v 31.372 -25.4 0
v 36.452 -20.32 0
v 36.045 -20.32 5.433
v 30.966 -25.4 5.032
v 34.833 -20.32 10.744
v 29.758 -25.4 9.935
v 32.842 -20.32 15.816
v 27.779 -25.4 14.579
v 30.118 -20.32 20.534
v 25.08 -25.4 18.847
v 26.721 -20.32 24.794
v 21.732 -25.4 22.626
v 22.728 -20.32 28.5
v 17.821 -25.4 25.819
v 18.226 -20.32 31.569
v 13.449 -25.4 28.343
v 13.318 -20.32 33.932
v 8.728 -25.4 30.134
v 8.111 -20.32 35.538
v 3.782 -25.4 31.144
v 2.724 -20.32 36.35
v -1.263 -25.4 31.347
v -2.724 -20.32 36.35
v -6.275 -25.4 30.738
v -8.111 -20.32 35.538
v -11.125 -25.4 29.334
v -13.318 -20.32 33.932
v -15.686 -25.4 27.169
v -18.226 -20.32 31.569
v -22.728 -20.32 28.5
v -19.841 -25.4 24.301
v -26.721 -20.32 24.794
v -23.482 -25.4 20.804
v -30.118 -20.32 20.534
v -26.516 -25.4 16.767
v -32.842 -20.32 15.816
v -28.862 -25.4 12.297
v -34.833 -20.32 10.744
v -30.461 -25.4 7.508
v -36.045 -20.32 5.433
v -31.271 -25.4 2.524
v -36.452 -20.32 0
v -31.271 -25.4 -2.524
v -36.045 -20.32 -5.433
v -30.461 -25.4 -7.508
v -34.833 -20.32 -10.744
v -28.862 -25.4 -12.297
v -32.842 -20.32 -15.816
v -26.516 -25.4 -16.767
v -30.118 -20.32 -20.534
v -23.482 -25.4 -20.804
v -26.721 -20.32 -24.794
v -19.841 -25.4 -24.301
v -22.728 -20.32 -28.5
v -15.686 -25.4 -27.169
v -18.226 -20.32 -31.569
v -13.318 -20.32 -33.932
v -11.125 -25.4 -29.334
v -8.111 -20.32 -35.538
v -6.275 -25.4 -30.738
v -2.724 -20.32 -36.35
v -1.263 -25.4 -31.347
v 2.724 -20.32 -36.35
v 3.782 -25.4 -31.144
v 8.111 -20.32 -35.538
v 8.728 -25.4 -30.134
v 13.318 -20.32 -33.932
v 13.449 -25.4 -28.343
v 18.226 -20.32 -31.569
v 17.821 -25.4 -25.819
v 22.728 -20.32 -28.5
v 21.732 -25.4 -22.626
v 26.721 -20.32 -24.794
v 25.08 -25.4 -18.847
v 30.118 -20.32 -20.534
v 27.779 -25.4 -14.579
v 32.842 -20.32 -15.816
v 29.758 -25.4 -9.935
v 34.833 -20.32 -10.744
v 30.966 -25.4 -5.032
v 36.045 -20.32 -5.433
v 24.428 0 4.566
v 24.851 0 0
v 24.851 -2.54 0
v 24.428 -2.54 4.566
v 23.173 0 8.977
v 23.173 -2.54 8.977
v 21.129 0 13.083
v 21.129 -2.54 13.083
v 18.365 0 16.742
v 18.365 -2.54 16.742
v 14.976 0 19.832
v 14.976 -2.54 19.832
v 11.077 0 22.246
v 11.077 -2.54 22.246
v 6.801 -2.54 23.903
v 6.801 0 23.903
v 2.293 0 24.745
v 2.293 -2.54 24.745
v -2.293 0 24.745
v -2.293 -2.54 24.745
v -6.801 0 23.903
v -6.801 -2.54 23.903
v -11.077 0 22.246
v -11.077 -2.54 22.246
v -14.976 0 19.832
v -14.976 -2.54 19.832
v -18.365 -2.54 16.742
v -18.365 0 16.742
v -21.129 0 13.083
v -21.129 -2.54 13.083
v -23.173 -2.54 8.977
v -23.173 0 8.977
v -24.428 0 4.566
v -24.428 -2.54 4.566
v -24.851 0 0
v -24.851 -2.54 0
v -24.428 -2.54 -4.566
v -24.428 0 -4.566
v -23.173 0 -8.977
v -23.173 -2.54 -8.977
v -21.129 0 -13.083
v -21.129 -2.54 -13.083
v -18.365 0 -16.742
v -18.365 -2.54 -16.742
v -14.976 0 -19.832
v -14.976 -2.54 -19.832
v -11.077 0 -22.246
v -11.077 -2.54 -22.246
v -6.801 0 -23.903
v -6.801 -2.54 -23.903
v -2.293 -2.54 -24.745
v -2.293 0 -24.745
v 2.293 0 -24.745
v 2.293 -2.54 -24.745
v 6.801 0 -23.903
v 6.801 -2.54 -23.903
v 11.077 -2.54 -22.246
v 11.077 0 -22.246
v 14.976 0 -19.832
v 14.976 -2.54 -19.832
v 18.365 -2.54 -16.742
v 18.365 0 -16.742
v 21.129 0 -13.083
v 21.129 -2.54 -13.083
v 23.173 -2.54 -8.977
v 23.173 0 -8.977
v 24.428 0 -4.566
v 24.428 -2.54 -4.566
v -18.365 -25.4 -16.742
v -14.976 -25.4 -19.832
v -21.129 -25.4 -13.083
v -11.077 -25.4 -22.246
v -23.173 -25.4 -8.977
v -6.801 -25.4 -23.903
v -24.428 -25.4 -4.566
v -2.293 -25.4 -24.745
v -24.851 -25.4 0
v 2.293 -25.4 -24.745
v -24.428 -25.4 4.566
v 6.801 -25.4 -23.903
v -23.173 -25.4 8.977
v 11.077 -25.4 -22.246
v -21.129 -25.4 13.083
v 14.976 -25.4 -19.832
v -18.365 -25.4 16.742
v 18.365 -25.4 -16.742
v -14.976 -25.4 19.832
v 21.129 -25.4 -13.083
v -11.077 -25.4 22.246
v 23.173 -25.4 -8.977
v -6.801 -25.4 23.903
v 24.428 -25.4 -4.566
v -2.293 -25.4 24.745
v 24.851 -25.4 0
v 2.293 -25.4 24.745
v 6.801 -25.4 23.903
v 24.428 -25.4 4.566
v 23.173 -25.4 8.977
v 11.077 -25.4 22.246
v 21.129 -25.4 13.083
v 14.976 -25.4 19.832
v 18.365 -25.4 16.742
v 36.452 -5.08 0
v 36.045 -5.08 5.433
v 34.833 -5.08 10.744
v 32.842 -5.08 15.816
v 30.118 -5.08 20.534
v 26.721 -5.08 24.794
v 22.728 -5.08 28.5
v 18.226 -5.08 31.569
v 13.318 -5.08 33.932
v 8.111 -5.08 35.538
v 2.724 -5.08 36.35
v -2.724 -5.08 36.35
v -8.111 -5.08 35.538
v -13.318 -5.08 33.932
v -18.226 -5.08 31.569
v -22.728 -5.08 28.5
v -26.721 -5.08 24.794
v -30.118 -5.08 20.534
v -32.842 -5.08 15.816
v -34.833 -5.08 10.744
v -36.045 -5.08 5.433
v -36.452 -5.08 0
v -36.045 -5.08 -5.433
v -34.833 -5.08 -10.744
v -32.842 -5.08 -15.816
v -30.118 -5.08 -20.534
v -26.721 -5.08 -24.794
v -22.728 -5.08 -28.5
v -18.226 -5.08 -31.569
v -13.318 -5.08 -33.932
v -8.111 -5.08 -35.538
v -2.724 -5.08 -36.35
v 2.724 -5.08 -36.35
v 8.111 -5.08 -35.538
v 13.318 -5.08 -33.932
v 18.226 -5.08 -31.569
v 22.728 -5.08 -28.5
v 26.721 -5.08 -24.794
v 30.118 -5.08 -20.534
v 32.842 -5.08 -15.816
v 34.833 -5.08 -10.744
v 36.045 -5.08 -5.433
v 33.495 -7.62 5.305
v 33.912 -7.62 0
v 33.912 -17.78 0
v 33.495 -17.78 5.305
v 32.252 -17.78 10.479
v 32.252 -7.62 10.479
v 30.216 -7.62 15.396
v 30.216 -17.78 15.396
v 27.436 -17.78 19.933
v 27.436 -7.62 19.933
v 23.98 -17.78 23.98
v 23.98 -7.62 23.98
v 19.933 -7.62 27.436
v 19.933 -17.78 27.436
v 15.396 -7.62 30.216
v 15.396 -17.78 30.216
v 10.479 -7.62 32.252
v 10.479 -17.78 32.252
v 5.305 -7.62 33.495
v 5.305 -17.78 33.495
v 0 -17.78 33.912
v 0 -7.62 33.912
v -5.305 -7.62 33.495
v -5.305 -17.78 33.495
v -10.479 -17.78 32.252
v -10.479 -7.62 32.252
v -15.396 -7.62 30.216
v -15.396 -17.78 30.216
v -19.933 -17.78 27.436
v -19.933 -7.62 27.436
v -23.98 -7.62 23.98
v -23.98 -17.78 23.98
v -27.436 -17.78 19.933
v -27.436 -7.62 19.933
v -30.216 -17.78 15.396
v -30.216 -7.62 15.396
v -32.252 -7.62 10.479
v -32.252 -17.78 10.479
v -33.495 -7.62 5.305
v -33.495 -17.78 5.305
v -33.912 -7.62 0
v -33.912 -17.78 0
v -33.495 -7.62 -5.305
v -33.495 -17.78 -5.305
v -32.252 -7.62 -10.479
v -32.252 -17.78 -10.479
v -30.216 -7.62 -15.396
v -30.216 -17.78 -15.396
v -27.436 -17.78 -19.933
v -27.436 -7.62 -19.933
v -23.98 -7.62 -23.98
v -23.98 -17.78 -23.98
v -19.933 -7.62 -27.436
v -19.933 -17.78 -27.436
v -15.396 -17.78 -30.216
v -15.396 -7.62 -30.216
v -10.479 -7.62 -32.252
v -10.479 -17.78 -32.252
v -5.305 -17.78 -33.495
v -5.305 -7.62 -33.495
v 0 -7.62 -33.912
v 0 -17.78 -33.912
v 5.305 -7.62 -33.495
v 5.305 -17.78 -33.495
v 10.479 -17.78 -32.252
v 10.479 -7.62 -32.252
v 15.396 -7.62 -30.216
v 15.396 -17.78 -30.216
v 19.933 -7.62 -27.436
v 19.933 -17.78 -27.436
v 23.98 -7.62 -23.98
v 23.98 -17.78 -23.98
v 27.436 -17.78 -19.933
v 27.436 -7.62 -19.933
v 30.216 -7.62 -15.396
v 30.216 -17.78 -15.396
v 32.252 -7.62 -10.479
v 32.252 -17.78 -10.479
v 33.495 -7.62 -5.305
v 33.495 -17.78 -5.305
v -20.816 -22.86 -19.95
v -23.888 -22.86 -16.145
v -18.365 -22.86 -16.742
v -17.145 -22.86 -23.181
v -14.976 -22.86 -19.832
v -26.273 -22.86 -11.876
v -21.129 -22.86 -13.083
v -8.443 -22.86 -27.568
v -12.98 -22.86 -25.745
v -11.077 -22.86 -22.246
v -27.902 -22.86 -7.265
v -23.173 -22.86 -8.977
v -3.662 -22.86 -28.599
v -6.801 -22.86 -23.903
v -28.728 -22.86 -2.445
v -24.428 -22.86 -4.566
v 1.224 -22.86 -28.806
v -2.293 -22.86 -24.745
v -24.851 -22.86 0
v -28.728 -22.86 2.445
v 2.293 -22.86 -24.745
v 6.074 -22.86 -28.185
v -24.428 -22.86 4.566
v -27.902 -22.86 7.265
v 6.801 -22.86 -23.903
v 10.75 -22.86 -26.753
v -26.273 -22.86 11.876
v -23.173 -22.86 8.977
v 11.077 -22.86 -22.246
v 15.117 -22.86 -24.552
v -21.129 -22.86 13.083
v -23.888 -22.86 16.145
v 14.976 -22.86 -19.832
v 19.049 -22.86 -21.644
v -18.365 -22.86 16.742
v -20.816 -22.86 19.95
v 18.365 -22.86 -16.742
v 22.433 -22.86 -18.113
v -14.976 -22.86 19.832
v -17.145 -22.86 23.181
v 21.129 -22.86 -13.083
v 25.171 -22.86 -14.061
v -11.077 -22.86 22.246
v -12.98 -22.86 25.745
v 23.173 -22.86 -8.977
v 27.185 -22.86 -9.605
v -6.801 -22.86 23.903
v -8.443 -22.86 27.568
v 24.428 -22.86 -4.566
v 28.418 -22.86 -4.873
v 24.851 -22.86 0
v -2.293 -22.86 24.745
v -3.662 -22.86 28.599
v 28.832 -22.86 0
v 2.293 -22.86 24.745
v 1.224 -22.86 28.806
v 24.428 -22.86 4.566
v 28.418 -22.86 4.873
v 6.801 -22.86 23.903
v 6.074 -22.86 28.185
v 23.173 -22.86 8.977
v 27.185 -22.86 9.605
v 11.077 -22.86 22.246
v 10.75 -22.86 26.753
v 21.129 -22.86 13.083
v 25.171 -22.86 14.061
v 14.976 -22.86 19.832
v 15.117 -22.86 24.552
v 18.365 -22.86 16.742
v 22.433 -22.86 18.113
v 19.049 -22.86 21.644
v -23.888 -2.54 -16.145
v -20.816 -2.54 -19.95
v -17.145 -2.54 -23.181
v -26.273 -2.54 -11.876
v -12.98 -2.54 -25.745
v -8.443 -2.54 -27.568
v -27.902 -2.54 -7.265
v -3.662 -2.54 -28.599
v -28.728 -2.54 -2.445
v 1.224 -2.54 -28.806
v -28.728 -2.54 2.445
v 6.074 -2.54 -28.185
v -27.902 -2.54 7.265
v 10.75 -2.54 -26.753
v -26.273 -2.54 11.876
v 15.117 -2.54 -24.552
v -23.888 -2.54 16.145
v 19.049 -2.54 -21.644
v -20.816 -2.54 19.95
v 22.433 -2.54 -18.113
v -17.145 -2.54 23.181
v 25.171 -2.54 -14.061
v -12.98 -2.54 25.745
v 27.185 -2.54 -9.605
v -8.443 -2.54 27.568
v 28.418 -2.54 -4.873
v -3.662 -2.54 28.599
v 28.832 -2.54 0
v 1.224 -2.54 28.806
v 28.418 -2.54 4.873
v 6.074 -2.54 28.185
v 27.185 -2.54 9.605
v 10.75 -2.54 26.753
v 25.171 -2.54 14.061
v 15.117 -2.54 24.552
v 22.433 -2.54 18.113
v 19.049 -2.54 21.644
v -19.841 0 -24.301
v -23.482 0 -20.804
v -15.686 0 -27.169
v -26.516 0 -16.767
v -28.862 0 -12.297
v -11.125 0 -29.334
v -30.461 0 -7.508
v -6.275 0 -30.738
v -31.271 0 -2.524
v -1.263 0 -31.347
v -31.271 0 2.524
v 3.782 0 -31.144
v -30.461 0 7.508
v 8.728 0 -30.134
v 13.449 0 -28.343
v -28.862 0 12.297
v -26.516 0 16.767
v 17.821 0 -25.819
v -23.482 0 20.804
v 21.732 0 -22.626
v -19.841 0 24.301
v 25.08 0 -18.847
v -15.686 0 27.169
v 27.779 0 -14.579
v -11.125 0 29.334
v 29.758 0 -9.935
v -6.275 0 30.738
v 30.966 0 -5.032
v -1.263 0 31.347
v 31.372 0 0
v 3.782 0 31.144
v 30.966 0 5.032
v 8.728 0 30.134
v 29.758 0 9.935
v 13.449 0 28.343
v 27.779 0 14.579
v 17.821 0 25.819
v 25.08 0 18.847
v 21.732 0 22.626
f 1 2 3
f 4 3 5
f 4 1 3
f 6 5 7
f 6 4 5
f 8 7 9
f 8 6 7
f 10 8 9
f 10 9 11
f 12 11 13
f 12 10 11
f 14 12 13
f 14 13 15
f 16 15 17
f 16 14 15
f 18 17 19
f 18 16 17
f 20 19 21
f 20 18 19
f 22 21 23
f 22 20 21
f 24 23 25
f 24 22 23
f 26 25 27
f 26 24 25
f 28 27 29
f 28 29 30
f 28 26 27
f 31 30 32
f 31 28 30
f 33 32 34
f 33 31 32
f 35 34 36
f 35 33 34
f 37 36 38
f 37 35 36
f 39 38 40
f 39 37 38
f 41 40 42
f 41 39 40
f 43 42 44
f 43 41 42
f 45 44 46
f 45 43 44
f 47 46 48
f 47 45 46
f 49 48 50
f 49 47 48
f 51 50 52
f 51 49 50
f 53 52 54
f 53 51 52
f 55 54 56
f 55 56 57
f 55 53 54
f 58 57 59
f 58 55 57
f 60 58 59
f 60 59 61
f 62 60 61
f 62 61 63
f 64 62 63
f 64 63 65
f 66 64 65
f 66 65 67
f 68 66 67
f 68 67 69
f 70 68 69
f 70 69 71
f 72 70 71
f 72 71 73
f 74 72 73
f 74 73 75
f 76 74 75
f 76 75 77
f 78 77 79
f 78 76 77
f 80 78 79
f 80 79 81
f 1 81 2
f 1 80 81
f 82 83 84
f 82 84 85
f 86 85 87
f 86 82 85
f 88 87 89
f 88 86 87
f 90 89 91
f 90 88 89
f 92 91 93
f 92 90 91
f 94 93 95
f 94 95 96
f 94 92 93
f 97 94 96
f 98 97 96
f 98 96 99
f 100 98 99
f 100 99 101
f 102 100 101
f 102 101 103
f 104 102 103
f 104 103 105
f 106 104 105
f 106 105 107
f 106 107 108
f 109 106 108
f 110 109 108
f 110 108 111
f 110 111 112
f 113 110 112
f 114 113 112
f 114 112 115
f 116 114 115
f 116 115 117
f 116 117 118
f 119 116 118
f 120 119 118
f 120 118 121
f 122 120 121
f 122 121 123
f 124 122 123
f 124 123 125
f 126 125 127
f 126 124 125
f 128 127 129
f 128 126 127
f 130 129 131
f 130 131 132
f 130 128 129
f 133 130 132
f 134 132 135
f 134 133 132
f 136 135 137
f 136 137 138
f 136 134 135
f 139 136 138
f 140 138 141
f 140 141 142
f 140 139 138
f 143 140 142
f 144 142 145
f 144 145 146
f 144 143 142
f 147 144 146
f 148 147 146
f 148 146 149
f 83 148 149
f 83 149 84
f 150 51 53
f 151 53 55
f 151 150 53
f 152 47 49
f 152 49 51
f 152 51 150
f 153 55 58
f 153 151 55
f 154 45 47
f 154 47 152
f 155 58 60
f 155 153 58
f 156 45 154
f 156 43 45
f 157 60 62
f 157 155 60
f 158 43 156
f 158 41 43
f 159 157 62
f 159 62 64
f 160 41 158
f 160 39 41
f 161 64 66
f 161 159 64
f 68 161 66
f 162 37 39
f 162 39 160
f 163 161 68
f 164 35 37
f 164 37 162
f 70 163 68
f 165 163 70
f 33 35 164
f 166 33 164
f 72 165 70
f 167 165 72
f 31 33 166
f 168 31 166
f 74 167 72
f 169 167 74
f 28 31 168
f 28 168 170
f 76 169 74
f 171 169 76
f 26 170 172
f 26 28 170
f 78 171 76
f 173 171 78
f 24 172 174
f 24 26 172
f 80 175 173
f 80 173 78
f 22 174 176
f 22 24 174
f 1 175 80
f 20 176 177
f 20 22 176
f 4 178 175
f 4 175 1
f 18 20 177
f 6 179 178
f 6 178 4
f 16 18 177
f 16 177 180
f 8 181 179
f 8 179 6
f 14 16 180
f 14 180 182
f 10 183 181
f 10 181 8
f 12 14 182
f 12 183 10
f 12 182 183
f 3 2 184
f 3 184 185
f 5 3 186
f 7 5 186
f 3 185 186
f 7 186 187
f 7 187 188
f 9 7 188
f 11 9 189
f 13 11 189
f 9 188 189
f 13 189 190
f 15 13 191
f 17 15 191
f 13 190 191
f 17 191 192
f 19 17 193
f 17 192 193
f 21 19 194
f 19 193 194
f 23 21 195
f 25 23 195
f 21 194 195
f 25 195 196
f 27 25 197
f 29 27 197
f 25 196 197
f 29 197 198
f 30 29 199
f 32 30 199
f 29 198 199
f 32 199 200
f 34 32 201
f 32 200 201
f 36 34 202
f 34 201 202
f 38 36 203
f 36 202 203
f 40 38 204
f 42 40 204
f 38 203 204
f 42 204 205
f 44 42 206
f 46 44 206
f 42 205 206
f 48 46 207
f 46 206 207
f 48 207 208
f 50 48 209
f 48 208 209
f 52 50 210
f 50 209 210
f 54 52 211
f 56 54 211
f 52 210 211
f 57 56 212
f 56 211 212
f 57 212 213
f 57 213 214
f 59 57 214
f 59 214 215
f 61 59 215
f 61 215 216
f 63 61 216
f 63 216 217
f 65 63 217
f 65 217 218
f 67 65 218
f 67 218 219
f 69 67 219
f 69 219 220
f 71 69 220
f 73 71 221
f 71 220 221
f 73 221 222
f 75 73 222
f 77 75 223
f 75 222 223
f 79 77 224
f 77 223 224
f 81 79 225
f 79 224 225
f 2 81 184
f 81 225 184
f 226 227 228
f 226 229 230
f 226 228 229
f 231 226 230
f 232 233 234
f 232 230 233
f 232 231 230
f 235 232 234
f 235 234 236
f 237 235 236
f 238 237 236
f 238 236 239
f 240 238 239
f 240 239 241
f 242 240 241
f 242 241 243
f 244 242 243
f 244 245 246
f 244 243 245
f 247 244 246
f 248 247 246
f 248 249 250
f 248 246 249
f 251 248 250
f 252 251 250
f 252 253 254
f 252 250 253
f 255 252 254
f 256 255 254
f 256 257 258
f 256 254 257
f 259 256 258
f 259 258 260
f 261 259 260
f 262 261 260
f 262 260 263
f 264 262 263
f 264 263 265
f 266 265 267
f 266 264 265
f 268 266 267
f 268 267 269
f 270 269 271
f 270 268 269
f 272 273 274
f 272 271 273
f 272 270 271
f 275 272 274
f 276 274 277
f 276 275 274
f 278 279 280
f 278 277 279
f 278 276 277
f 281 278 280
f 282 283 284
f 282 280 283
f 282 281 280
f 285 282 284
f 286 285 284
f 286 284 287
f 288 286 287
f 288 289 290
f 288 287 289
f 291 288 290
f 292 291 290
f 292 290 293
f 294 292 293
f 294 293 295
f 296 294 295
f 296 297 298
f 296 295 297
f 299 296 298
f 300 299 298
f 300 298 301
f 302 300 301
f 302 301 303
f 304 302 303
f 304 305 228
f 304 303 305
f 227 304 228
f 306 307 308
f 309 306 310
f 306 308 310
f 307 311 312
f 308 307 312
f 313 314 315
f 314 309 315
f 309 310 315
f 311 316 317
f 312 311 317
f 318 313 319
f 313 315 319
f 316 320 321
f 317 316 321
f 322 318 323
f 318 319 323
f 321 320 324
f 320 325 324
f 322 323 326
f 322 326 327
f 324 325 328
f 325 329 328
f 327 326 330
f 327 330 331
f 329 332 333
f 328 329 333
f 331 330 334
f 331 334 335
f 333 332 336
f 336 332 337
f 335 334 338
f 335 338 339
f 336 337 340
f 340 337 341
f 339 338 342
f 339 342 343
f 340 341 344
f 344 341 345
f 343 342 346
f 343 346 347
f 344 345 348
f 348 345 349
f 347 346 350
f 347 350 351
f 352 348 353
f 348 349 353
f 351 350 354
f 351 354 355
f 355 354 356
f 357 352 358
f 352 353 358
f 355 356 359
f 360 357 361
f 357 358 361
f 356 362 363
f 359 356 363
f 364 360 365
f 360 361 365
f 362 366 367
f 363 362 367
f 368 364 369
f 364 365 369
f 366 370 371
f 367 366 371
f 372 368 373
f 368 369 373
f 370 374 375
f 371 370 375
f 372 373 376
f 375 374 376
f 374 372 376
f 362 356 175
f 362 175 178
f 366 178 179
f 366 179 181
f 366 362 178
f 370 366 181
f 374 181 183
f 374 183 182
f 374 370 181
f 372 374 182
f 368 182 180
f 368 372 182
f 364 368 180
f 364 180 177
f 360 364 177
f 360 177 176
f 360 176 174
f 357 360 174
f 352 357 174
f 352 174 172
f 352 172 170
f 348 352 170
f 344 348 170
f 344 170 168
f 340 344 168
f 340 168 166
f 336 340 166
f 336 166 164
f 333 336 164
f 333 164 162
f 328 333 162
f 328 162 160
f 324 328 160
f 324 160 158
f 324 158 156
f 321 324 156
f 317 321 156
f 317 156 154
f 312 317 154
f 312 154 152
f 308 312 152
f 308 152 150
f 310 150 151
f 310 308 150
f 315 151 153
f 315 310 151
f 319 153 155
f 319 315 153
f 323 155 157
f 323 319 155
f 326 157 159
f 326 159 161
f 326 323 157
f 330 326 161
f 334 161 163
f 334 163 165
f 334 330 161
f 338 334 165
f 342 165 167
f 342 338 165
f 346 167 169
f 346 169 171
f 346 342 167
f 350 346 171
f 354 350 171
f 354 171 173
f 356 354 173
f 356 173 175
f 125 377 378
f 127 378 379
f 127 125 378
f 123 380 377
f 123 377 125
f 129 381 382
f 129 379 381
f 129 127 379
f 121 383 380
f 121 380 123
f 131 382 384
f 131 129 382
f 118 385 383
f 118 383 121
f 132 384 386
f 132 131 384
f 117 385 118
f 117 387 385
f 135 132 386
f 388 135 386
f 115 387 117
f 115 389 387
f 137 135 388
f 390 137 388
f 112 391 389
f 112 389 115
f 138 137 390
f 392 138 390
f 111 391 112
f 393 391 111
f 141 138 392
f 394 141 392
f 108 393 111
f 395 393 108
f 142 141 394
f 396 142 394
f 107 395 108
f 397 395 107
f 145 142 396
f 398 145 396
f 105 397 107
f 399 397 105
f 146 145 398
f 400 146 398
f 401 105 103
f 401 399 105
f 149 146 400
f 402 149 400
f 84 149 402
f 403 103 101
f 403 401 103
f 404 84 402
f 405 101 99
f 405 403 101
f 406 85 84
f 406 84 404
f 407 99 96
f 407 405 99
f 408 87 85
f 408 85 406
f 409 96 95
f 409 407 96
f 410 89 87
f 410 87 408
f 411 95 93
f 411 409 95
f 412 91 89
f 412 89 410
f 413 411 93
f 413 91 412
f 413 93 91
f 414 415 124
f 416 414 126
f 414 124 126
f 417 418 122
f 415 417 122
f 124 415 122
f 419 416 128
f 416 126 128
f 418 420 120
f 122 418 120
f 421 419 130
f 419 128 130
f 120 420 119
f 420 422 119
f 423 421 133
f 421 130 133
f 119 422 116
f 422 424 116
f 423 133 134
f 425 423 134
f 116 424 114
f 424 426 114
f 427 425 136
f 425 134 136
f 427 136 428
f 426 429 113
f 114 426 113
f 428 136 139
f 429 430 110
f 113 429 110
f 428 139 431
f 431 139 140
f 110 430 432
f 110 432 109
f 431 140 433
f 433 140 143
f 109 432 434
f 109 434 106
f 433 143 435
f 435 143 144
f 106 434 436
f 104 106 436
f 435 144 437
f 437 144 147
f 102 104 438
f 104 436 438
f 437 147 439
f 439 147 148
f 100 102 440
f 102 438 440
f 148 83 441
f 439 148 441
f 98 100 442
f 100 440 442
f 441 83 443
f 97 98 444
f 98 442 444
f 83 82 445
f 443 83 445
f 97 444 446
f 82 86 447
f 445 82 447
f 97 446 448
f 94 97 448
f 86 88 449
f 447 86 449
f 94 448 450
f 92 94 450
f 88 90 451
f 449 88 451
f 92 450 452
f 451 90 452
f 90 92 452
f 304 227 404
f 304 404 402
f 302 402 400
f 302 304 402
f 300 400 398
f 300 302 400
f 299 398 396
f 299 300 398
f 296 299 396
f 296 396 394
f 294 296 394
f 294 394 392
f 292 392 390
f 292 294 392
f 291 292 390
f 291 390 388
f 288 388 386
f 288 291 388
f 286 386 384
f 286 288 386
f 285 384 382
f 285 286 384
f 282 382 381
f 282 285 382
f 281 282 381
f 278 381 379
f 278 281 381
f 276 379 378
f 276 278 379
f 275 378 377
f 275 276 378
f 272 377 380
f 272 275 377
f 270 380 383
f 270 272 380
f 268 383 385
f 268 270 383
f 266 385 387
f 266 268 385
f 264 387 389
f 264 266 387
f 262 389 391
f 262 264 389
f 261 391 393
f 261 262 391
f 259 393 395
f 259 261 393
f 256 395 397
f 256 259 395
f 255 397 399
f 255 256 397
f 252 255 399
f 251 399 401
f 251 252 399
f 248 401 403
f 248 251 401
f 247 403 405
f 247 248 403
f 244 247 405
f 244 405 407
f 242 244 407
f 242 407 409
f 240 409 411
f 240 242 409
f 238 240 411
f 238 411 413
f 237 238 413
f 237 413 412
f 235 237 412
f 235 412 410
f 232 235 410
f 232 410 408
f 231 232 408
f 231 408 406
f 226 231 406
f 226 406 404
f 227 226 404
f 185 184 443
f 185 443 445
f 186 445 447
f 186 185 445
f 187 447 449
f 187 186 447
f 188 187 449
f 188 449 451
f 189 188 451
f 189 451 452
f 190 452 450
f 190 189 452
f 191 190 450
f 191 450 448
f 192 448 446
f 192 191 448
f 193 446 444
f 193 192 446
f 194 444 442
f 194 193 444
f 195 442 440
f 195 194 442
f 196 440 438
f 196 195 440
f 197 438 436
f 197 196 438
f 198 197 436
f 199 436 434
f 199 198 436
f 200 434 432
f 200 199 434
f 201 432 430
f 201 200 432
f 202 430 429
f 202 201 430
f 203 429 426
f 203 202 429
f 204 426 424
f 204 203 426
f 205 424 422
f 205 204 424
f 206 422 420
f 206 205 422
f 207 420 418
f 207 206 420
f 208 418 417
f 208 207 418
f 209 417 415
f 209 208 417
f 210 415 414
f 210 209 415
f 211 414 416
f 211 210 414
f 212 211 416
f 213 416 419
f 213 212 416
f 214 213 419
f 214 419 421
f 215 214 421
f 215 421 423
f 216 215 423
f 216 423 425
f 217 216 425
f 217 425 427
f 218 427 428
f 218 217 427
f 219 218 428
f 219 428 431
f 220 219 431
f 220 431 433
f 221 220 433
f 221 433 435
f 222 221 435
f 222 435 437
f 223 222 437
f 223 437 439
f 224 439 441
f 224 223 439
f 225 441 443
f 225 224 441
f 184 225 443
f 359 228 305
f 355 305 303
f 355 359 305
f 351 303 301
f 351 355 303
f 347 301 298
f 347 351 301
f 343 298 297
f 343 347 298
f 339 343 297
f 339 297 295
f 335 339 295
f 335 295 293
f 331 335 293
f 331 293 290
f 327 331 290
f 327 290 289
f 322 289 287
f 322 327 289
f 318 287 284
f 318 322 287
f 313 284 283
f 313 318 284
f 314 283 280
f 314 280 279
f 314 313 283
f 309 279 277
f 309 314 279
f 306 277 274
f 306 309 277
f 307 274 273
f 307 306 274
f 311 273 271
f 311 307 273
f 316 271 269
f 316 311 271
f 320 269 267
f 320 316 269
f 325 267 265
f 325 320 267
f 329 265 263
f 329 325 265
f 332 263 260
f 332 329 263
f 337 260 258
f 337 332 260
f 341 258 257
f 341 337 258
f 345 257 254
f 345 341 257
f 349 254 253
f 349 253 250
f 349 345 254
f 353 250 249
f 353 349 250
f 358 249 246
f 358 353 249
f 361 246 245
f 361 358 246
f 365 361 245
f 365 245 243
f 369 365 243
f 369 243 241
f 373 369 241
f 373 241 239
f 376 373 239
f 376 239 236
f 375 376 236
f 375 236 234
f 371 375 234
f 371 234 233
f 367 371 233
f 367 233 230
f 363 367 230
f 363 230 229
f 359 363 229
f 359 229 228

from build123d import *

# Parameters (mm, degrees)
F0_R     = 36.4522696474
F0_R_2   = 24.8513580129
F1_DEPTH = 25.4
F2_T     = -2.54
F3_SIZE  = 5.08
F4_SIZE  = 5.08


with BuildPart() as f1:
    # F0 (on Front) → F1 (new body)
    with BuildSketch(Plane.XZ):
        Circle(F0_R)
        Circle(F0_R_2, mode=Mode.SUBTRACT)
    extrude(amount=F1_DEPTH)

    # F2
    f2_openings = [f1.faces().sort_by_distance(p)[0] for p in [
        (-24.851358, -12.7, 0),
    ]]
    offset(amount=F2_T, openings=f2_openings)

    # F3
    f3_edges = [f1.edges().sort_by_distance(p)[0] for p in [
        (33.91227, -12.7, 0),
        (-33.91227, -2.54, 0),
        (-33.91227, -22.86, 0),
    ]]
    chamfer(f3_edges, length=F3_SIZE)

    # F4
    f4_edges = [f1.edges().sort_by_distance(p)[0] for p in [
        (36.45227, -12.7, 0),
        (-36.45227, 0, 0),
        (-36.45227, -25.4, 0),
    ]]
    chamfer(f4_edges, length=F4_SIZE)


solid = f1.part
